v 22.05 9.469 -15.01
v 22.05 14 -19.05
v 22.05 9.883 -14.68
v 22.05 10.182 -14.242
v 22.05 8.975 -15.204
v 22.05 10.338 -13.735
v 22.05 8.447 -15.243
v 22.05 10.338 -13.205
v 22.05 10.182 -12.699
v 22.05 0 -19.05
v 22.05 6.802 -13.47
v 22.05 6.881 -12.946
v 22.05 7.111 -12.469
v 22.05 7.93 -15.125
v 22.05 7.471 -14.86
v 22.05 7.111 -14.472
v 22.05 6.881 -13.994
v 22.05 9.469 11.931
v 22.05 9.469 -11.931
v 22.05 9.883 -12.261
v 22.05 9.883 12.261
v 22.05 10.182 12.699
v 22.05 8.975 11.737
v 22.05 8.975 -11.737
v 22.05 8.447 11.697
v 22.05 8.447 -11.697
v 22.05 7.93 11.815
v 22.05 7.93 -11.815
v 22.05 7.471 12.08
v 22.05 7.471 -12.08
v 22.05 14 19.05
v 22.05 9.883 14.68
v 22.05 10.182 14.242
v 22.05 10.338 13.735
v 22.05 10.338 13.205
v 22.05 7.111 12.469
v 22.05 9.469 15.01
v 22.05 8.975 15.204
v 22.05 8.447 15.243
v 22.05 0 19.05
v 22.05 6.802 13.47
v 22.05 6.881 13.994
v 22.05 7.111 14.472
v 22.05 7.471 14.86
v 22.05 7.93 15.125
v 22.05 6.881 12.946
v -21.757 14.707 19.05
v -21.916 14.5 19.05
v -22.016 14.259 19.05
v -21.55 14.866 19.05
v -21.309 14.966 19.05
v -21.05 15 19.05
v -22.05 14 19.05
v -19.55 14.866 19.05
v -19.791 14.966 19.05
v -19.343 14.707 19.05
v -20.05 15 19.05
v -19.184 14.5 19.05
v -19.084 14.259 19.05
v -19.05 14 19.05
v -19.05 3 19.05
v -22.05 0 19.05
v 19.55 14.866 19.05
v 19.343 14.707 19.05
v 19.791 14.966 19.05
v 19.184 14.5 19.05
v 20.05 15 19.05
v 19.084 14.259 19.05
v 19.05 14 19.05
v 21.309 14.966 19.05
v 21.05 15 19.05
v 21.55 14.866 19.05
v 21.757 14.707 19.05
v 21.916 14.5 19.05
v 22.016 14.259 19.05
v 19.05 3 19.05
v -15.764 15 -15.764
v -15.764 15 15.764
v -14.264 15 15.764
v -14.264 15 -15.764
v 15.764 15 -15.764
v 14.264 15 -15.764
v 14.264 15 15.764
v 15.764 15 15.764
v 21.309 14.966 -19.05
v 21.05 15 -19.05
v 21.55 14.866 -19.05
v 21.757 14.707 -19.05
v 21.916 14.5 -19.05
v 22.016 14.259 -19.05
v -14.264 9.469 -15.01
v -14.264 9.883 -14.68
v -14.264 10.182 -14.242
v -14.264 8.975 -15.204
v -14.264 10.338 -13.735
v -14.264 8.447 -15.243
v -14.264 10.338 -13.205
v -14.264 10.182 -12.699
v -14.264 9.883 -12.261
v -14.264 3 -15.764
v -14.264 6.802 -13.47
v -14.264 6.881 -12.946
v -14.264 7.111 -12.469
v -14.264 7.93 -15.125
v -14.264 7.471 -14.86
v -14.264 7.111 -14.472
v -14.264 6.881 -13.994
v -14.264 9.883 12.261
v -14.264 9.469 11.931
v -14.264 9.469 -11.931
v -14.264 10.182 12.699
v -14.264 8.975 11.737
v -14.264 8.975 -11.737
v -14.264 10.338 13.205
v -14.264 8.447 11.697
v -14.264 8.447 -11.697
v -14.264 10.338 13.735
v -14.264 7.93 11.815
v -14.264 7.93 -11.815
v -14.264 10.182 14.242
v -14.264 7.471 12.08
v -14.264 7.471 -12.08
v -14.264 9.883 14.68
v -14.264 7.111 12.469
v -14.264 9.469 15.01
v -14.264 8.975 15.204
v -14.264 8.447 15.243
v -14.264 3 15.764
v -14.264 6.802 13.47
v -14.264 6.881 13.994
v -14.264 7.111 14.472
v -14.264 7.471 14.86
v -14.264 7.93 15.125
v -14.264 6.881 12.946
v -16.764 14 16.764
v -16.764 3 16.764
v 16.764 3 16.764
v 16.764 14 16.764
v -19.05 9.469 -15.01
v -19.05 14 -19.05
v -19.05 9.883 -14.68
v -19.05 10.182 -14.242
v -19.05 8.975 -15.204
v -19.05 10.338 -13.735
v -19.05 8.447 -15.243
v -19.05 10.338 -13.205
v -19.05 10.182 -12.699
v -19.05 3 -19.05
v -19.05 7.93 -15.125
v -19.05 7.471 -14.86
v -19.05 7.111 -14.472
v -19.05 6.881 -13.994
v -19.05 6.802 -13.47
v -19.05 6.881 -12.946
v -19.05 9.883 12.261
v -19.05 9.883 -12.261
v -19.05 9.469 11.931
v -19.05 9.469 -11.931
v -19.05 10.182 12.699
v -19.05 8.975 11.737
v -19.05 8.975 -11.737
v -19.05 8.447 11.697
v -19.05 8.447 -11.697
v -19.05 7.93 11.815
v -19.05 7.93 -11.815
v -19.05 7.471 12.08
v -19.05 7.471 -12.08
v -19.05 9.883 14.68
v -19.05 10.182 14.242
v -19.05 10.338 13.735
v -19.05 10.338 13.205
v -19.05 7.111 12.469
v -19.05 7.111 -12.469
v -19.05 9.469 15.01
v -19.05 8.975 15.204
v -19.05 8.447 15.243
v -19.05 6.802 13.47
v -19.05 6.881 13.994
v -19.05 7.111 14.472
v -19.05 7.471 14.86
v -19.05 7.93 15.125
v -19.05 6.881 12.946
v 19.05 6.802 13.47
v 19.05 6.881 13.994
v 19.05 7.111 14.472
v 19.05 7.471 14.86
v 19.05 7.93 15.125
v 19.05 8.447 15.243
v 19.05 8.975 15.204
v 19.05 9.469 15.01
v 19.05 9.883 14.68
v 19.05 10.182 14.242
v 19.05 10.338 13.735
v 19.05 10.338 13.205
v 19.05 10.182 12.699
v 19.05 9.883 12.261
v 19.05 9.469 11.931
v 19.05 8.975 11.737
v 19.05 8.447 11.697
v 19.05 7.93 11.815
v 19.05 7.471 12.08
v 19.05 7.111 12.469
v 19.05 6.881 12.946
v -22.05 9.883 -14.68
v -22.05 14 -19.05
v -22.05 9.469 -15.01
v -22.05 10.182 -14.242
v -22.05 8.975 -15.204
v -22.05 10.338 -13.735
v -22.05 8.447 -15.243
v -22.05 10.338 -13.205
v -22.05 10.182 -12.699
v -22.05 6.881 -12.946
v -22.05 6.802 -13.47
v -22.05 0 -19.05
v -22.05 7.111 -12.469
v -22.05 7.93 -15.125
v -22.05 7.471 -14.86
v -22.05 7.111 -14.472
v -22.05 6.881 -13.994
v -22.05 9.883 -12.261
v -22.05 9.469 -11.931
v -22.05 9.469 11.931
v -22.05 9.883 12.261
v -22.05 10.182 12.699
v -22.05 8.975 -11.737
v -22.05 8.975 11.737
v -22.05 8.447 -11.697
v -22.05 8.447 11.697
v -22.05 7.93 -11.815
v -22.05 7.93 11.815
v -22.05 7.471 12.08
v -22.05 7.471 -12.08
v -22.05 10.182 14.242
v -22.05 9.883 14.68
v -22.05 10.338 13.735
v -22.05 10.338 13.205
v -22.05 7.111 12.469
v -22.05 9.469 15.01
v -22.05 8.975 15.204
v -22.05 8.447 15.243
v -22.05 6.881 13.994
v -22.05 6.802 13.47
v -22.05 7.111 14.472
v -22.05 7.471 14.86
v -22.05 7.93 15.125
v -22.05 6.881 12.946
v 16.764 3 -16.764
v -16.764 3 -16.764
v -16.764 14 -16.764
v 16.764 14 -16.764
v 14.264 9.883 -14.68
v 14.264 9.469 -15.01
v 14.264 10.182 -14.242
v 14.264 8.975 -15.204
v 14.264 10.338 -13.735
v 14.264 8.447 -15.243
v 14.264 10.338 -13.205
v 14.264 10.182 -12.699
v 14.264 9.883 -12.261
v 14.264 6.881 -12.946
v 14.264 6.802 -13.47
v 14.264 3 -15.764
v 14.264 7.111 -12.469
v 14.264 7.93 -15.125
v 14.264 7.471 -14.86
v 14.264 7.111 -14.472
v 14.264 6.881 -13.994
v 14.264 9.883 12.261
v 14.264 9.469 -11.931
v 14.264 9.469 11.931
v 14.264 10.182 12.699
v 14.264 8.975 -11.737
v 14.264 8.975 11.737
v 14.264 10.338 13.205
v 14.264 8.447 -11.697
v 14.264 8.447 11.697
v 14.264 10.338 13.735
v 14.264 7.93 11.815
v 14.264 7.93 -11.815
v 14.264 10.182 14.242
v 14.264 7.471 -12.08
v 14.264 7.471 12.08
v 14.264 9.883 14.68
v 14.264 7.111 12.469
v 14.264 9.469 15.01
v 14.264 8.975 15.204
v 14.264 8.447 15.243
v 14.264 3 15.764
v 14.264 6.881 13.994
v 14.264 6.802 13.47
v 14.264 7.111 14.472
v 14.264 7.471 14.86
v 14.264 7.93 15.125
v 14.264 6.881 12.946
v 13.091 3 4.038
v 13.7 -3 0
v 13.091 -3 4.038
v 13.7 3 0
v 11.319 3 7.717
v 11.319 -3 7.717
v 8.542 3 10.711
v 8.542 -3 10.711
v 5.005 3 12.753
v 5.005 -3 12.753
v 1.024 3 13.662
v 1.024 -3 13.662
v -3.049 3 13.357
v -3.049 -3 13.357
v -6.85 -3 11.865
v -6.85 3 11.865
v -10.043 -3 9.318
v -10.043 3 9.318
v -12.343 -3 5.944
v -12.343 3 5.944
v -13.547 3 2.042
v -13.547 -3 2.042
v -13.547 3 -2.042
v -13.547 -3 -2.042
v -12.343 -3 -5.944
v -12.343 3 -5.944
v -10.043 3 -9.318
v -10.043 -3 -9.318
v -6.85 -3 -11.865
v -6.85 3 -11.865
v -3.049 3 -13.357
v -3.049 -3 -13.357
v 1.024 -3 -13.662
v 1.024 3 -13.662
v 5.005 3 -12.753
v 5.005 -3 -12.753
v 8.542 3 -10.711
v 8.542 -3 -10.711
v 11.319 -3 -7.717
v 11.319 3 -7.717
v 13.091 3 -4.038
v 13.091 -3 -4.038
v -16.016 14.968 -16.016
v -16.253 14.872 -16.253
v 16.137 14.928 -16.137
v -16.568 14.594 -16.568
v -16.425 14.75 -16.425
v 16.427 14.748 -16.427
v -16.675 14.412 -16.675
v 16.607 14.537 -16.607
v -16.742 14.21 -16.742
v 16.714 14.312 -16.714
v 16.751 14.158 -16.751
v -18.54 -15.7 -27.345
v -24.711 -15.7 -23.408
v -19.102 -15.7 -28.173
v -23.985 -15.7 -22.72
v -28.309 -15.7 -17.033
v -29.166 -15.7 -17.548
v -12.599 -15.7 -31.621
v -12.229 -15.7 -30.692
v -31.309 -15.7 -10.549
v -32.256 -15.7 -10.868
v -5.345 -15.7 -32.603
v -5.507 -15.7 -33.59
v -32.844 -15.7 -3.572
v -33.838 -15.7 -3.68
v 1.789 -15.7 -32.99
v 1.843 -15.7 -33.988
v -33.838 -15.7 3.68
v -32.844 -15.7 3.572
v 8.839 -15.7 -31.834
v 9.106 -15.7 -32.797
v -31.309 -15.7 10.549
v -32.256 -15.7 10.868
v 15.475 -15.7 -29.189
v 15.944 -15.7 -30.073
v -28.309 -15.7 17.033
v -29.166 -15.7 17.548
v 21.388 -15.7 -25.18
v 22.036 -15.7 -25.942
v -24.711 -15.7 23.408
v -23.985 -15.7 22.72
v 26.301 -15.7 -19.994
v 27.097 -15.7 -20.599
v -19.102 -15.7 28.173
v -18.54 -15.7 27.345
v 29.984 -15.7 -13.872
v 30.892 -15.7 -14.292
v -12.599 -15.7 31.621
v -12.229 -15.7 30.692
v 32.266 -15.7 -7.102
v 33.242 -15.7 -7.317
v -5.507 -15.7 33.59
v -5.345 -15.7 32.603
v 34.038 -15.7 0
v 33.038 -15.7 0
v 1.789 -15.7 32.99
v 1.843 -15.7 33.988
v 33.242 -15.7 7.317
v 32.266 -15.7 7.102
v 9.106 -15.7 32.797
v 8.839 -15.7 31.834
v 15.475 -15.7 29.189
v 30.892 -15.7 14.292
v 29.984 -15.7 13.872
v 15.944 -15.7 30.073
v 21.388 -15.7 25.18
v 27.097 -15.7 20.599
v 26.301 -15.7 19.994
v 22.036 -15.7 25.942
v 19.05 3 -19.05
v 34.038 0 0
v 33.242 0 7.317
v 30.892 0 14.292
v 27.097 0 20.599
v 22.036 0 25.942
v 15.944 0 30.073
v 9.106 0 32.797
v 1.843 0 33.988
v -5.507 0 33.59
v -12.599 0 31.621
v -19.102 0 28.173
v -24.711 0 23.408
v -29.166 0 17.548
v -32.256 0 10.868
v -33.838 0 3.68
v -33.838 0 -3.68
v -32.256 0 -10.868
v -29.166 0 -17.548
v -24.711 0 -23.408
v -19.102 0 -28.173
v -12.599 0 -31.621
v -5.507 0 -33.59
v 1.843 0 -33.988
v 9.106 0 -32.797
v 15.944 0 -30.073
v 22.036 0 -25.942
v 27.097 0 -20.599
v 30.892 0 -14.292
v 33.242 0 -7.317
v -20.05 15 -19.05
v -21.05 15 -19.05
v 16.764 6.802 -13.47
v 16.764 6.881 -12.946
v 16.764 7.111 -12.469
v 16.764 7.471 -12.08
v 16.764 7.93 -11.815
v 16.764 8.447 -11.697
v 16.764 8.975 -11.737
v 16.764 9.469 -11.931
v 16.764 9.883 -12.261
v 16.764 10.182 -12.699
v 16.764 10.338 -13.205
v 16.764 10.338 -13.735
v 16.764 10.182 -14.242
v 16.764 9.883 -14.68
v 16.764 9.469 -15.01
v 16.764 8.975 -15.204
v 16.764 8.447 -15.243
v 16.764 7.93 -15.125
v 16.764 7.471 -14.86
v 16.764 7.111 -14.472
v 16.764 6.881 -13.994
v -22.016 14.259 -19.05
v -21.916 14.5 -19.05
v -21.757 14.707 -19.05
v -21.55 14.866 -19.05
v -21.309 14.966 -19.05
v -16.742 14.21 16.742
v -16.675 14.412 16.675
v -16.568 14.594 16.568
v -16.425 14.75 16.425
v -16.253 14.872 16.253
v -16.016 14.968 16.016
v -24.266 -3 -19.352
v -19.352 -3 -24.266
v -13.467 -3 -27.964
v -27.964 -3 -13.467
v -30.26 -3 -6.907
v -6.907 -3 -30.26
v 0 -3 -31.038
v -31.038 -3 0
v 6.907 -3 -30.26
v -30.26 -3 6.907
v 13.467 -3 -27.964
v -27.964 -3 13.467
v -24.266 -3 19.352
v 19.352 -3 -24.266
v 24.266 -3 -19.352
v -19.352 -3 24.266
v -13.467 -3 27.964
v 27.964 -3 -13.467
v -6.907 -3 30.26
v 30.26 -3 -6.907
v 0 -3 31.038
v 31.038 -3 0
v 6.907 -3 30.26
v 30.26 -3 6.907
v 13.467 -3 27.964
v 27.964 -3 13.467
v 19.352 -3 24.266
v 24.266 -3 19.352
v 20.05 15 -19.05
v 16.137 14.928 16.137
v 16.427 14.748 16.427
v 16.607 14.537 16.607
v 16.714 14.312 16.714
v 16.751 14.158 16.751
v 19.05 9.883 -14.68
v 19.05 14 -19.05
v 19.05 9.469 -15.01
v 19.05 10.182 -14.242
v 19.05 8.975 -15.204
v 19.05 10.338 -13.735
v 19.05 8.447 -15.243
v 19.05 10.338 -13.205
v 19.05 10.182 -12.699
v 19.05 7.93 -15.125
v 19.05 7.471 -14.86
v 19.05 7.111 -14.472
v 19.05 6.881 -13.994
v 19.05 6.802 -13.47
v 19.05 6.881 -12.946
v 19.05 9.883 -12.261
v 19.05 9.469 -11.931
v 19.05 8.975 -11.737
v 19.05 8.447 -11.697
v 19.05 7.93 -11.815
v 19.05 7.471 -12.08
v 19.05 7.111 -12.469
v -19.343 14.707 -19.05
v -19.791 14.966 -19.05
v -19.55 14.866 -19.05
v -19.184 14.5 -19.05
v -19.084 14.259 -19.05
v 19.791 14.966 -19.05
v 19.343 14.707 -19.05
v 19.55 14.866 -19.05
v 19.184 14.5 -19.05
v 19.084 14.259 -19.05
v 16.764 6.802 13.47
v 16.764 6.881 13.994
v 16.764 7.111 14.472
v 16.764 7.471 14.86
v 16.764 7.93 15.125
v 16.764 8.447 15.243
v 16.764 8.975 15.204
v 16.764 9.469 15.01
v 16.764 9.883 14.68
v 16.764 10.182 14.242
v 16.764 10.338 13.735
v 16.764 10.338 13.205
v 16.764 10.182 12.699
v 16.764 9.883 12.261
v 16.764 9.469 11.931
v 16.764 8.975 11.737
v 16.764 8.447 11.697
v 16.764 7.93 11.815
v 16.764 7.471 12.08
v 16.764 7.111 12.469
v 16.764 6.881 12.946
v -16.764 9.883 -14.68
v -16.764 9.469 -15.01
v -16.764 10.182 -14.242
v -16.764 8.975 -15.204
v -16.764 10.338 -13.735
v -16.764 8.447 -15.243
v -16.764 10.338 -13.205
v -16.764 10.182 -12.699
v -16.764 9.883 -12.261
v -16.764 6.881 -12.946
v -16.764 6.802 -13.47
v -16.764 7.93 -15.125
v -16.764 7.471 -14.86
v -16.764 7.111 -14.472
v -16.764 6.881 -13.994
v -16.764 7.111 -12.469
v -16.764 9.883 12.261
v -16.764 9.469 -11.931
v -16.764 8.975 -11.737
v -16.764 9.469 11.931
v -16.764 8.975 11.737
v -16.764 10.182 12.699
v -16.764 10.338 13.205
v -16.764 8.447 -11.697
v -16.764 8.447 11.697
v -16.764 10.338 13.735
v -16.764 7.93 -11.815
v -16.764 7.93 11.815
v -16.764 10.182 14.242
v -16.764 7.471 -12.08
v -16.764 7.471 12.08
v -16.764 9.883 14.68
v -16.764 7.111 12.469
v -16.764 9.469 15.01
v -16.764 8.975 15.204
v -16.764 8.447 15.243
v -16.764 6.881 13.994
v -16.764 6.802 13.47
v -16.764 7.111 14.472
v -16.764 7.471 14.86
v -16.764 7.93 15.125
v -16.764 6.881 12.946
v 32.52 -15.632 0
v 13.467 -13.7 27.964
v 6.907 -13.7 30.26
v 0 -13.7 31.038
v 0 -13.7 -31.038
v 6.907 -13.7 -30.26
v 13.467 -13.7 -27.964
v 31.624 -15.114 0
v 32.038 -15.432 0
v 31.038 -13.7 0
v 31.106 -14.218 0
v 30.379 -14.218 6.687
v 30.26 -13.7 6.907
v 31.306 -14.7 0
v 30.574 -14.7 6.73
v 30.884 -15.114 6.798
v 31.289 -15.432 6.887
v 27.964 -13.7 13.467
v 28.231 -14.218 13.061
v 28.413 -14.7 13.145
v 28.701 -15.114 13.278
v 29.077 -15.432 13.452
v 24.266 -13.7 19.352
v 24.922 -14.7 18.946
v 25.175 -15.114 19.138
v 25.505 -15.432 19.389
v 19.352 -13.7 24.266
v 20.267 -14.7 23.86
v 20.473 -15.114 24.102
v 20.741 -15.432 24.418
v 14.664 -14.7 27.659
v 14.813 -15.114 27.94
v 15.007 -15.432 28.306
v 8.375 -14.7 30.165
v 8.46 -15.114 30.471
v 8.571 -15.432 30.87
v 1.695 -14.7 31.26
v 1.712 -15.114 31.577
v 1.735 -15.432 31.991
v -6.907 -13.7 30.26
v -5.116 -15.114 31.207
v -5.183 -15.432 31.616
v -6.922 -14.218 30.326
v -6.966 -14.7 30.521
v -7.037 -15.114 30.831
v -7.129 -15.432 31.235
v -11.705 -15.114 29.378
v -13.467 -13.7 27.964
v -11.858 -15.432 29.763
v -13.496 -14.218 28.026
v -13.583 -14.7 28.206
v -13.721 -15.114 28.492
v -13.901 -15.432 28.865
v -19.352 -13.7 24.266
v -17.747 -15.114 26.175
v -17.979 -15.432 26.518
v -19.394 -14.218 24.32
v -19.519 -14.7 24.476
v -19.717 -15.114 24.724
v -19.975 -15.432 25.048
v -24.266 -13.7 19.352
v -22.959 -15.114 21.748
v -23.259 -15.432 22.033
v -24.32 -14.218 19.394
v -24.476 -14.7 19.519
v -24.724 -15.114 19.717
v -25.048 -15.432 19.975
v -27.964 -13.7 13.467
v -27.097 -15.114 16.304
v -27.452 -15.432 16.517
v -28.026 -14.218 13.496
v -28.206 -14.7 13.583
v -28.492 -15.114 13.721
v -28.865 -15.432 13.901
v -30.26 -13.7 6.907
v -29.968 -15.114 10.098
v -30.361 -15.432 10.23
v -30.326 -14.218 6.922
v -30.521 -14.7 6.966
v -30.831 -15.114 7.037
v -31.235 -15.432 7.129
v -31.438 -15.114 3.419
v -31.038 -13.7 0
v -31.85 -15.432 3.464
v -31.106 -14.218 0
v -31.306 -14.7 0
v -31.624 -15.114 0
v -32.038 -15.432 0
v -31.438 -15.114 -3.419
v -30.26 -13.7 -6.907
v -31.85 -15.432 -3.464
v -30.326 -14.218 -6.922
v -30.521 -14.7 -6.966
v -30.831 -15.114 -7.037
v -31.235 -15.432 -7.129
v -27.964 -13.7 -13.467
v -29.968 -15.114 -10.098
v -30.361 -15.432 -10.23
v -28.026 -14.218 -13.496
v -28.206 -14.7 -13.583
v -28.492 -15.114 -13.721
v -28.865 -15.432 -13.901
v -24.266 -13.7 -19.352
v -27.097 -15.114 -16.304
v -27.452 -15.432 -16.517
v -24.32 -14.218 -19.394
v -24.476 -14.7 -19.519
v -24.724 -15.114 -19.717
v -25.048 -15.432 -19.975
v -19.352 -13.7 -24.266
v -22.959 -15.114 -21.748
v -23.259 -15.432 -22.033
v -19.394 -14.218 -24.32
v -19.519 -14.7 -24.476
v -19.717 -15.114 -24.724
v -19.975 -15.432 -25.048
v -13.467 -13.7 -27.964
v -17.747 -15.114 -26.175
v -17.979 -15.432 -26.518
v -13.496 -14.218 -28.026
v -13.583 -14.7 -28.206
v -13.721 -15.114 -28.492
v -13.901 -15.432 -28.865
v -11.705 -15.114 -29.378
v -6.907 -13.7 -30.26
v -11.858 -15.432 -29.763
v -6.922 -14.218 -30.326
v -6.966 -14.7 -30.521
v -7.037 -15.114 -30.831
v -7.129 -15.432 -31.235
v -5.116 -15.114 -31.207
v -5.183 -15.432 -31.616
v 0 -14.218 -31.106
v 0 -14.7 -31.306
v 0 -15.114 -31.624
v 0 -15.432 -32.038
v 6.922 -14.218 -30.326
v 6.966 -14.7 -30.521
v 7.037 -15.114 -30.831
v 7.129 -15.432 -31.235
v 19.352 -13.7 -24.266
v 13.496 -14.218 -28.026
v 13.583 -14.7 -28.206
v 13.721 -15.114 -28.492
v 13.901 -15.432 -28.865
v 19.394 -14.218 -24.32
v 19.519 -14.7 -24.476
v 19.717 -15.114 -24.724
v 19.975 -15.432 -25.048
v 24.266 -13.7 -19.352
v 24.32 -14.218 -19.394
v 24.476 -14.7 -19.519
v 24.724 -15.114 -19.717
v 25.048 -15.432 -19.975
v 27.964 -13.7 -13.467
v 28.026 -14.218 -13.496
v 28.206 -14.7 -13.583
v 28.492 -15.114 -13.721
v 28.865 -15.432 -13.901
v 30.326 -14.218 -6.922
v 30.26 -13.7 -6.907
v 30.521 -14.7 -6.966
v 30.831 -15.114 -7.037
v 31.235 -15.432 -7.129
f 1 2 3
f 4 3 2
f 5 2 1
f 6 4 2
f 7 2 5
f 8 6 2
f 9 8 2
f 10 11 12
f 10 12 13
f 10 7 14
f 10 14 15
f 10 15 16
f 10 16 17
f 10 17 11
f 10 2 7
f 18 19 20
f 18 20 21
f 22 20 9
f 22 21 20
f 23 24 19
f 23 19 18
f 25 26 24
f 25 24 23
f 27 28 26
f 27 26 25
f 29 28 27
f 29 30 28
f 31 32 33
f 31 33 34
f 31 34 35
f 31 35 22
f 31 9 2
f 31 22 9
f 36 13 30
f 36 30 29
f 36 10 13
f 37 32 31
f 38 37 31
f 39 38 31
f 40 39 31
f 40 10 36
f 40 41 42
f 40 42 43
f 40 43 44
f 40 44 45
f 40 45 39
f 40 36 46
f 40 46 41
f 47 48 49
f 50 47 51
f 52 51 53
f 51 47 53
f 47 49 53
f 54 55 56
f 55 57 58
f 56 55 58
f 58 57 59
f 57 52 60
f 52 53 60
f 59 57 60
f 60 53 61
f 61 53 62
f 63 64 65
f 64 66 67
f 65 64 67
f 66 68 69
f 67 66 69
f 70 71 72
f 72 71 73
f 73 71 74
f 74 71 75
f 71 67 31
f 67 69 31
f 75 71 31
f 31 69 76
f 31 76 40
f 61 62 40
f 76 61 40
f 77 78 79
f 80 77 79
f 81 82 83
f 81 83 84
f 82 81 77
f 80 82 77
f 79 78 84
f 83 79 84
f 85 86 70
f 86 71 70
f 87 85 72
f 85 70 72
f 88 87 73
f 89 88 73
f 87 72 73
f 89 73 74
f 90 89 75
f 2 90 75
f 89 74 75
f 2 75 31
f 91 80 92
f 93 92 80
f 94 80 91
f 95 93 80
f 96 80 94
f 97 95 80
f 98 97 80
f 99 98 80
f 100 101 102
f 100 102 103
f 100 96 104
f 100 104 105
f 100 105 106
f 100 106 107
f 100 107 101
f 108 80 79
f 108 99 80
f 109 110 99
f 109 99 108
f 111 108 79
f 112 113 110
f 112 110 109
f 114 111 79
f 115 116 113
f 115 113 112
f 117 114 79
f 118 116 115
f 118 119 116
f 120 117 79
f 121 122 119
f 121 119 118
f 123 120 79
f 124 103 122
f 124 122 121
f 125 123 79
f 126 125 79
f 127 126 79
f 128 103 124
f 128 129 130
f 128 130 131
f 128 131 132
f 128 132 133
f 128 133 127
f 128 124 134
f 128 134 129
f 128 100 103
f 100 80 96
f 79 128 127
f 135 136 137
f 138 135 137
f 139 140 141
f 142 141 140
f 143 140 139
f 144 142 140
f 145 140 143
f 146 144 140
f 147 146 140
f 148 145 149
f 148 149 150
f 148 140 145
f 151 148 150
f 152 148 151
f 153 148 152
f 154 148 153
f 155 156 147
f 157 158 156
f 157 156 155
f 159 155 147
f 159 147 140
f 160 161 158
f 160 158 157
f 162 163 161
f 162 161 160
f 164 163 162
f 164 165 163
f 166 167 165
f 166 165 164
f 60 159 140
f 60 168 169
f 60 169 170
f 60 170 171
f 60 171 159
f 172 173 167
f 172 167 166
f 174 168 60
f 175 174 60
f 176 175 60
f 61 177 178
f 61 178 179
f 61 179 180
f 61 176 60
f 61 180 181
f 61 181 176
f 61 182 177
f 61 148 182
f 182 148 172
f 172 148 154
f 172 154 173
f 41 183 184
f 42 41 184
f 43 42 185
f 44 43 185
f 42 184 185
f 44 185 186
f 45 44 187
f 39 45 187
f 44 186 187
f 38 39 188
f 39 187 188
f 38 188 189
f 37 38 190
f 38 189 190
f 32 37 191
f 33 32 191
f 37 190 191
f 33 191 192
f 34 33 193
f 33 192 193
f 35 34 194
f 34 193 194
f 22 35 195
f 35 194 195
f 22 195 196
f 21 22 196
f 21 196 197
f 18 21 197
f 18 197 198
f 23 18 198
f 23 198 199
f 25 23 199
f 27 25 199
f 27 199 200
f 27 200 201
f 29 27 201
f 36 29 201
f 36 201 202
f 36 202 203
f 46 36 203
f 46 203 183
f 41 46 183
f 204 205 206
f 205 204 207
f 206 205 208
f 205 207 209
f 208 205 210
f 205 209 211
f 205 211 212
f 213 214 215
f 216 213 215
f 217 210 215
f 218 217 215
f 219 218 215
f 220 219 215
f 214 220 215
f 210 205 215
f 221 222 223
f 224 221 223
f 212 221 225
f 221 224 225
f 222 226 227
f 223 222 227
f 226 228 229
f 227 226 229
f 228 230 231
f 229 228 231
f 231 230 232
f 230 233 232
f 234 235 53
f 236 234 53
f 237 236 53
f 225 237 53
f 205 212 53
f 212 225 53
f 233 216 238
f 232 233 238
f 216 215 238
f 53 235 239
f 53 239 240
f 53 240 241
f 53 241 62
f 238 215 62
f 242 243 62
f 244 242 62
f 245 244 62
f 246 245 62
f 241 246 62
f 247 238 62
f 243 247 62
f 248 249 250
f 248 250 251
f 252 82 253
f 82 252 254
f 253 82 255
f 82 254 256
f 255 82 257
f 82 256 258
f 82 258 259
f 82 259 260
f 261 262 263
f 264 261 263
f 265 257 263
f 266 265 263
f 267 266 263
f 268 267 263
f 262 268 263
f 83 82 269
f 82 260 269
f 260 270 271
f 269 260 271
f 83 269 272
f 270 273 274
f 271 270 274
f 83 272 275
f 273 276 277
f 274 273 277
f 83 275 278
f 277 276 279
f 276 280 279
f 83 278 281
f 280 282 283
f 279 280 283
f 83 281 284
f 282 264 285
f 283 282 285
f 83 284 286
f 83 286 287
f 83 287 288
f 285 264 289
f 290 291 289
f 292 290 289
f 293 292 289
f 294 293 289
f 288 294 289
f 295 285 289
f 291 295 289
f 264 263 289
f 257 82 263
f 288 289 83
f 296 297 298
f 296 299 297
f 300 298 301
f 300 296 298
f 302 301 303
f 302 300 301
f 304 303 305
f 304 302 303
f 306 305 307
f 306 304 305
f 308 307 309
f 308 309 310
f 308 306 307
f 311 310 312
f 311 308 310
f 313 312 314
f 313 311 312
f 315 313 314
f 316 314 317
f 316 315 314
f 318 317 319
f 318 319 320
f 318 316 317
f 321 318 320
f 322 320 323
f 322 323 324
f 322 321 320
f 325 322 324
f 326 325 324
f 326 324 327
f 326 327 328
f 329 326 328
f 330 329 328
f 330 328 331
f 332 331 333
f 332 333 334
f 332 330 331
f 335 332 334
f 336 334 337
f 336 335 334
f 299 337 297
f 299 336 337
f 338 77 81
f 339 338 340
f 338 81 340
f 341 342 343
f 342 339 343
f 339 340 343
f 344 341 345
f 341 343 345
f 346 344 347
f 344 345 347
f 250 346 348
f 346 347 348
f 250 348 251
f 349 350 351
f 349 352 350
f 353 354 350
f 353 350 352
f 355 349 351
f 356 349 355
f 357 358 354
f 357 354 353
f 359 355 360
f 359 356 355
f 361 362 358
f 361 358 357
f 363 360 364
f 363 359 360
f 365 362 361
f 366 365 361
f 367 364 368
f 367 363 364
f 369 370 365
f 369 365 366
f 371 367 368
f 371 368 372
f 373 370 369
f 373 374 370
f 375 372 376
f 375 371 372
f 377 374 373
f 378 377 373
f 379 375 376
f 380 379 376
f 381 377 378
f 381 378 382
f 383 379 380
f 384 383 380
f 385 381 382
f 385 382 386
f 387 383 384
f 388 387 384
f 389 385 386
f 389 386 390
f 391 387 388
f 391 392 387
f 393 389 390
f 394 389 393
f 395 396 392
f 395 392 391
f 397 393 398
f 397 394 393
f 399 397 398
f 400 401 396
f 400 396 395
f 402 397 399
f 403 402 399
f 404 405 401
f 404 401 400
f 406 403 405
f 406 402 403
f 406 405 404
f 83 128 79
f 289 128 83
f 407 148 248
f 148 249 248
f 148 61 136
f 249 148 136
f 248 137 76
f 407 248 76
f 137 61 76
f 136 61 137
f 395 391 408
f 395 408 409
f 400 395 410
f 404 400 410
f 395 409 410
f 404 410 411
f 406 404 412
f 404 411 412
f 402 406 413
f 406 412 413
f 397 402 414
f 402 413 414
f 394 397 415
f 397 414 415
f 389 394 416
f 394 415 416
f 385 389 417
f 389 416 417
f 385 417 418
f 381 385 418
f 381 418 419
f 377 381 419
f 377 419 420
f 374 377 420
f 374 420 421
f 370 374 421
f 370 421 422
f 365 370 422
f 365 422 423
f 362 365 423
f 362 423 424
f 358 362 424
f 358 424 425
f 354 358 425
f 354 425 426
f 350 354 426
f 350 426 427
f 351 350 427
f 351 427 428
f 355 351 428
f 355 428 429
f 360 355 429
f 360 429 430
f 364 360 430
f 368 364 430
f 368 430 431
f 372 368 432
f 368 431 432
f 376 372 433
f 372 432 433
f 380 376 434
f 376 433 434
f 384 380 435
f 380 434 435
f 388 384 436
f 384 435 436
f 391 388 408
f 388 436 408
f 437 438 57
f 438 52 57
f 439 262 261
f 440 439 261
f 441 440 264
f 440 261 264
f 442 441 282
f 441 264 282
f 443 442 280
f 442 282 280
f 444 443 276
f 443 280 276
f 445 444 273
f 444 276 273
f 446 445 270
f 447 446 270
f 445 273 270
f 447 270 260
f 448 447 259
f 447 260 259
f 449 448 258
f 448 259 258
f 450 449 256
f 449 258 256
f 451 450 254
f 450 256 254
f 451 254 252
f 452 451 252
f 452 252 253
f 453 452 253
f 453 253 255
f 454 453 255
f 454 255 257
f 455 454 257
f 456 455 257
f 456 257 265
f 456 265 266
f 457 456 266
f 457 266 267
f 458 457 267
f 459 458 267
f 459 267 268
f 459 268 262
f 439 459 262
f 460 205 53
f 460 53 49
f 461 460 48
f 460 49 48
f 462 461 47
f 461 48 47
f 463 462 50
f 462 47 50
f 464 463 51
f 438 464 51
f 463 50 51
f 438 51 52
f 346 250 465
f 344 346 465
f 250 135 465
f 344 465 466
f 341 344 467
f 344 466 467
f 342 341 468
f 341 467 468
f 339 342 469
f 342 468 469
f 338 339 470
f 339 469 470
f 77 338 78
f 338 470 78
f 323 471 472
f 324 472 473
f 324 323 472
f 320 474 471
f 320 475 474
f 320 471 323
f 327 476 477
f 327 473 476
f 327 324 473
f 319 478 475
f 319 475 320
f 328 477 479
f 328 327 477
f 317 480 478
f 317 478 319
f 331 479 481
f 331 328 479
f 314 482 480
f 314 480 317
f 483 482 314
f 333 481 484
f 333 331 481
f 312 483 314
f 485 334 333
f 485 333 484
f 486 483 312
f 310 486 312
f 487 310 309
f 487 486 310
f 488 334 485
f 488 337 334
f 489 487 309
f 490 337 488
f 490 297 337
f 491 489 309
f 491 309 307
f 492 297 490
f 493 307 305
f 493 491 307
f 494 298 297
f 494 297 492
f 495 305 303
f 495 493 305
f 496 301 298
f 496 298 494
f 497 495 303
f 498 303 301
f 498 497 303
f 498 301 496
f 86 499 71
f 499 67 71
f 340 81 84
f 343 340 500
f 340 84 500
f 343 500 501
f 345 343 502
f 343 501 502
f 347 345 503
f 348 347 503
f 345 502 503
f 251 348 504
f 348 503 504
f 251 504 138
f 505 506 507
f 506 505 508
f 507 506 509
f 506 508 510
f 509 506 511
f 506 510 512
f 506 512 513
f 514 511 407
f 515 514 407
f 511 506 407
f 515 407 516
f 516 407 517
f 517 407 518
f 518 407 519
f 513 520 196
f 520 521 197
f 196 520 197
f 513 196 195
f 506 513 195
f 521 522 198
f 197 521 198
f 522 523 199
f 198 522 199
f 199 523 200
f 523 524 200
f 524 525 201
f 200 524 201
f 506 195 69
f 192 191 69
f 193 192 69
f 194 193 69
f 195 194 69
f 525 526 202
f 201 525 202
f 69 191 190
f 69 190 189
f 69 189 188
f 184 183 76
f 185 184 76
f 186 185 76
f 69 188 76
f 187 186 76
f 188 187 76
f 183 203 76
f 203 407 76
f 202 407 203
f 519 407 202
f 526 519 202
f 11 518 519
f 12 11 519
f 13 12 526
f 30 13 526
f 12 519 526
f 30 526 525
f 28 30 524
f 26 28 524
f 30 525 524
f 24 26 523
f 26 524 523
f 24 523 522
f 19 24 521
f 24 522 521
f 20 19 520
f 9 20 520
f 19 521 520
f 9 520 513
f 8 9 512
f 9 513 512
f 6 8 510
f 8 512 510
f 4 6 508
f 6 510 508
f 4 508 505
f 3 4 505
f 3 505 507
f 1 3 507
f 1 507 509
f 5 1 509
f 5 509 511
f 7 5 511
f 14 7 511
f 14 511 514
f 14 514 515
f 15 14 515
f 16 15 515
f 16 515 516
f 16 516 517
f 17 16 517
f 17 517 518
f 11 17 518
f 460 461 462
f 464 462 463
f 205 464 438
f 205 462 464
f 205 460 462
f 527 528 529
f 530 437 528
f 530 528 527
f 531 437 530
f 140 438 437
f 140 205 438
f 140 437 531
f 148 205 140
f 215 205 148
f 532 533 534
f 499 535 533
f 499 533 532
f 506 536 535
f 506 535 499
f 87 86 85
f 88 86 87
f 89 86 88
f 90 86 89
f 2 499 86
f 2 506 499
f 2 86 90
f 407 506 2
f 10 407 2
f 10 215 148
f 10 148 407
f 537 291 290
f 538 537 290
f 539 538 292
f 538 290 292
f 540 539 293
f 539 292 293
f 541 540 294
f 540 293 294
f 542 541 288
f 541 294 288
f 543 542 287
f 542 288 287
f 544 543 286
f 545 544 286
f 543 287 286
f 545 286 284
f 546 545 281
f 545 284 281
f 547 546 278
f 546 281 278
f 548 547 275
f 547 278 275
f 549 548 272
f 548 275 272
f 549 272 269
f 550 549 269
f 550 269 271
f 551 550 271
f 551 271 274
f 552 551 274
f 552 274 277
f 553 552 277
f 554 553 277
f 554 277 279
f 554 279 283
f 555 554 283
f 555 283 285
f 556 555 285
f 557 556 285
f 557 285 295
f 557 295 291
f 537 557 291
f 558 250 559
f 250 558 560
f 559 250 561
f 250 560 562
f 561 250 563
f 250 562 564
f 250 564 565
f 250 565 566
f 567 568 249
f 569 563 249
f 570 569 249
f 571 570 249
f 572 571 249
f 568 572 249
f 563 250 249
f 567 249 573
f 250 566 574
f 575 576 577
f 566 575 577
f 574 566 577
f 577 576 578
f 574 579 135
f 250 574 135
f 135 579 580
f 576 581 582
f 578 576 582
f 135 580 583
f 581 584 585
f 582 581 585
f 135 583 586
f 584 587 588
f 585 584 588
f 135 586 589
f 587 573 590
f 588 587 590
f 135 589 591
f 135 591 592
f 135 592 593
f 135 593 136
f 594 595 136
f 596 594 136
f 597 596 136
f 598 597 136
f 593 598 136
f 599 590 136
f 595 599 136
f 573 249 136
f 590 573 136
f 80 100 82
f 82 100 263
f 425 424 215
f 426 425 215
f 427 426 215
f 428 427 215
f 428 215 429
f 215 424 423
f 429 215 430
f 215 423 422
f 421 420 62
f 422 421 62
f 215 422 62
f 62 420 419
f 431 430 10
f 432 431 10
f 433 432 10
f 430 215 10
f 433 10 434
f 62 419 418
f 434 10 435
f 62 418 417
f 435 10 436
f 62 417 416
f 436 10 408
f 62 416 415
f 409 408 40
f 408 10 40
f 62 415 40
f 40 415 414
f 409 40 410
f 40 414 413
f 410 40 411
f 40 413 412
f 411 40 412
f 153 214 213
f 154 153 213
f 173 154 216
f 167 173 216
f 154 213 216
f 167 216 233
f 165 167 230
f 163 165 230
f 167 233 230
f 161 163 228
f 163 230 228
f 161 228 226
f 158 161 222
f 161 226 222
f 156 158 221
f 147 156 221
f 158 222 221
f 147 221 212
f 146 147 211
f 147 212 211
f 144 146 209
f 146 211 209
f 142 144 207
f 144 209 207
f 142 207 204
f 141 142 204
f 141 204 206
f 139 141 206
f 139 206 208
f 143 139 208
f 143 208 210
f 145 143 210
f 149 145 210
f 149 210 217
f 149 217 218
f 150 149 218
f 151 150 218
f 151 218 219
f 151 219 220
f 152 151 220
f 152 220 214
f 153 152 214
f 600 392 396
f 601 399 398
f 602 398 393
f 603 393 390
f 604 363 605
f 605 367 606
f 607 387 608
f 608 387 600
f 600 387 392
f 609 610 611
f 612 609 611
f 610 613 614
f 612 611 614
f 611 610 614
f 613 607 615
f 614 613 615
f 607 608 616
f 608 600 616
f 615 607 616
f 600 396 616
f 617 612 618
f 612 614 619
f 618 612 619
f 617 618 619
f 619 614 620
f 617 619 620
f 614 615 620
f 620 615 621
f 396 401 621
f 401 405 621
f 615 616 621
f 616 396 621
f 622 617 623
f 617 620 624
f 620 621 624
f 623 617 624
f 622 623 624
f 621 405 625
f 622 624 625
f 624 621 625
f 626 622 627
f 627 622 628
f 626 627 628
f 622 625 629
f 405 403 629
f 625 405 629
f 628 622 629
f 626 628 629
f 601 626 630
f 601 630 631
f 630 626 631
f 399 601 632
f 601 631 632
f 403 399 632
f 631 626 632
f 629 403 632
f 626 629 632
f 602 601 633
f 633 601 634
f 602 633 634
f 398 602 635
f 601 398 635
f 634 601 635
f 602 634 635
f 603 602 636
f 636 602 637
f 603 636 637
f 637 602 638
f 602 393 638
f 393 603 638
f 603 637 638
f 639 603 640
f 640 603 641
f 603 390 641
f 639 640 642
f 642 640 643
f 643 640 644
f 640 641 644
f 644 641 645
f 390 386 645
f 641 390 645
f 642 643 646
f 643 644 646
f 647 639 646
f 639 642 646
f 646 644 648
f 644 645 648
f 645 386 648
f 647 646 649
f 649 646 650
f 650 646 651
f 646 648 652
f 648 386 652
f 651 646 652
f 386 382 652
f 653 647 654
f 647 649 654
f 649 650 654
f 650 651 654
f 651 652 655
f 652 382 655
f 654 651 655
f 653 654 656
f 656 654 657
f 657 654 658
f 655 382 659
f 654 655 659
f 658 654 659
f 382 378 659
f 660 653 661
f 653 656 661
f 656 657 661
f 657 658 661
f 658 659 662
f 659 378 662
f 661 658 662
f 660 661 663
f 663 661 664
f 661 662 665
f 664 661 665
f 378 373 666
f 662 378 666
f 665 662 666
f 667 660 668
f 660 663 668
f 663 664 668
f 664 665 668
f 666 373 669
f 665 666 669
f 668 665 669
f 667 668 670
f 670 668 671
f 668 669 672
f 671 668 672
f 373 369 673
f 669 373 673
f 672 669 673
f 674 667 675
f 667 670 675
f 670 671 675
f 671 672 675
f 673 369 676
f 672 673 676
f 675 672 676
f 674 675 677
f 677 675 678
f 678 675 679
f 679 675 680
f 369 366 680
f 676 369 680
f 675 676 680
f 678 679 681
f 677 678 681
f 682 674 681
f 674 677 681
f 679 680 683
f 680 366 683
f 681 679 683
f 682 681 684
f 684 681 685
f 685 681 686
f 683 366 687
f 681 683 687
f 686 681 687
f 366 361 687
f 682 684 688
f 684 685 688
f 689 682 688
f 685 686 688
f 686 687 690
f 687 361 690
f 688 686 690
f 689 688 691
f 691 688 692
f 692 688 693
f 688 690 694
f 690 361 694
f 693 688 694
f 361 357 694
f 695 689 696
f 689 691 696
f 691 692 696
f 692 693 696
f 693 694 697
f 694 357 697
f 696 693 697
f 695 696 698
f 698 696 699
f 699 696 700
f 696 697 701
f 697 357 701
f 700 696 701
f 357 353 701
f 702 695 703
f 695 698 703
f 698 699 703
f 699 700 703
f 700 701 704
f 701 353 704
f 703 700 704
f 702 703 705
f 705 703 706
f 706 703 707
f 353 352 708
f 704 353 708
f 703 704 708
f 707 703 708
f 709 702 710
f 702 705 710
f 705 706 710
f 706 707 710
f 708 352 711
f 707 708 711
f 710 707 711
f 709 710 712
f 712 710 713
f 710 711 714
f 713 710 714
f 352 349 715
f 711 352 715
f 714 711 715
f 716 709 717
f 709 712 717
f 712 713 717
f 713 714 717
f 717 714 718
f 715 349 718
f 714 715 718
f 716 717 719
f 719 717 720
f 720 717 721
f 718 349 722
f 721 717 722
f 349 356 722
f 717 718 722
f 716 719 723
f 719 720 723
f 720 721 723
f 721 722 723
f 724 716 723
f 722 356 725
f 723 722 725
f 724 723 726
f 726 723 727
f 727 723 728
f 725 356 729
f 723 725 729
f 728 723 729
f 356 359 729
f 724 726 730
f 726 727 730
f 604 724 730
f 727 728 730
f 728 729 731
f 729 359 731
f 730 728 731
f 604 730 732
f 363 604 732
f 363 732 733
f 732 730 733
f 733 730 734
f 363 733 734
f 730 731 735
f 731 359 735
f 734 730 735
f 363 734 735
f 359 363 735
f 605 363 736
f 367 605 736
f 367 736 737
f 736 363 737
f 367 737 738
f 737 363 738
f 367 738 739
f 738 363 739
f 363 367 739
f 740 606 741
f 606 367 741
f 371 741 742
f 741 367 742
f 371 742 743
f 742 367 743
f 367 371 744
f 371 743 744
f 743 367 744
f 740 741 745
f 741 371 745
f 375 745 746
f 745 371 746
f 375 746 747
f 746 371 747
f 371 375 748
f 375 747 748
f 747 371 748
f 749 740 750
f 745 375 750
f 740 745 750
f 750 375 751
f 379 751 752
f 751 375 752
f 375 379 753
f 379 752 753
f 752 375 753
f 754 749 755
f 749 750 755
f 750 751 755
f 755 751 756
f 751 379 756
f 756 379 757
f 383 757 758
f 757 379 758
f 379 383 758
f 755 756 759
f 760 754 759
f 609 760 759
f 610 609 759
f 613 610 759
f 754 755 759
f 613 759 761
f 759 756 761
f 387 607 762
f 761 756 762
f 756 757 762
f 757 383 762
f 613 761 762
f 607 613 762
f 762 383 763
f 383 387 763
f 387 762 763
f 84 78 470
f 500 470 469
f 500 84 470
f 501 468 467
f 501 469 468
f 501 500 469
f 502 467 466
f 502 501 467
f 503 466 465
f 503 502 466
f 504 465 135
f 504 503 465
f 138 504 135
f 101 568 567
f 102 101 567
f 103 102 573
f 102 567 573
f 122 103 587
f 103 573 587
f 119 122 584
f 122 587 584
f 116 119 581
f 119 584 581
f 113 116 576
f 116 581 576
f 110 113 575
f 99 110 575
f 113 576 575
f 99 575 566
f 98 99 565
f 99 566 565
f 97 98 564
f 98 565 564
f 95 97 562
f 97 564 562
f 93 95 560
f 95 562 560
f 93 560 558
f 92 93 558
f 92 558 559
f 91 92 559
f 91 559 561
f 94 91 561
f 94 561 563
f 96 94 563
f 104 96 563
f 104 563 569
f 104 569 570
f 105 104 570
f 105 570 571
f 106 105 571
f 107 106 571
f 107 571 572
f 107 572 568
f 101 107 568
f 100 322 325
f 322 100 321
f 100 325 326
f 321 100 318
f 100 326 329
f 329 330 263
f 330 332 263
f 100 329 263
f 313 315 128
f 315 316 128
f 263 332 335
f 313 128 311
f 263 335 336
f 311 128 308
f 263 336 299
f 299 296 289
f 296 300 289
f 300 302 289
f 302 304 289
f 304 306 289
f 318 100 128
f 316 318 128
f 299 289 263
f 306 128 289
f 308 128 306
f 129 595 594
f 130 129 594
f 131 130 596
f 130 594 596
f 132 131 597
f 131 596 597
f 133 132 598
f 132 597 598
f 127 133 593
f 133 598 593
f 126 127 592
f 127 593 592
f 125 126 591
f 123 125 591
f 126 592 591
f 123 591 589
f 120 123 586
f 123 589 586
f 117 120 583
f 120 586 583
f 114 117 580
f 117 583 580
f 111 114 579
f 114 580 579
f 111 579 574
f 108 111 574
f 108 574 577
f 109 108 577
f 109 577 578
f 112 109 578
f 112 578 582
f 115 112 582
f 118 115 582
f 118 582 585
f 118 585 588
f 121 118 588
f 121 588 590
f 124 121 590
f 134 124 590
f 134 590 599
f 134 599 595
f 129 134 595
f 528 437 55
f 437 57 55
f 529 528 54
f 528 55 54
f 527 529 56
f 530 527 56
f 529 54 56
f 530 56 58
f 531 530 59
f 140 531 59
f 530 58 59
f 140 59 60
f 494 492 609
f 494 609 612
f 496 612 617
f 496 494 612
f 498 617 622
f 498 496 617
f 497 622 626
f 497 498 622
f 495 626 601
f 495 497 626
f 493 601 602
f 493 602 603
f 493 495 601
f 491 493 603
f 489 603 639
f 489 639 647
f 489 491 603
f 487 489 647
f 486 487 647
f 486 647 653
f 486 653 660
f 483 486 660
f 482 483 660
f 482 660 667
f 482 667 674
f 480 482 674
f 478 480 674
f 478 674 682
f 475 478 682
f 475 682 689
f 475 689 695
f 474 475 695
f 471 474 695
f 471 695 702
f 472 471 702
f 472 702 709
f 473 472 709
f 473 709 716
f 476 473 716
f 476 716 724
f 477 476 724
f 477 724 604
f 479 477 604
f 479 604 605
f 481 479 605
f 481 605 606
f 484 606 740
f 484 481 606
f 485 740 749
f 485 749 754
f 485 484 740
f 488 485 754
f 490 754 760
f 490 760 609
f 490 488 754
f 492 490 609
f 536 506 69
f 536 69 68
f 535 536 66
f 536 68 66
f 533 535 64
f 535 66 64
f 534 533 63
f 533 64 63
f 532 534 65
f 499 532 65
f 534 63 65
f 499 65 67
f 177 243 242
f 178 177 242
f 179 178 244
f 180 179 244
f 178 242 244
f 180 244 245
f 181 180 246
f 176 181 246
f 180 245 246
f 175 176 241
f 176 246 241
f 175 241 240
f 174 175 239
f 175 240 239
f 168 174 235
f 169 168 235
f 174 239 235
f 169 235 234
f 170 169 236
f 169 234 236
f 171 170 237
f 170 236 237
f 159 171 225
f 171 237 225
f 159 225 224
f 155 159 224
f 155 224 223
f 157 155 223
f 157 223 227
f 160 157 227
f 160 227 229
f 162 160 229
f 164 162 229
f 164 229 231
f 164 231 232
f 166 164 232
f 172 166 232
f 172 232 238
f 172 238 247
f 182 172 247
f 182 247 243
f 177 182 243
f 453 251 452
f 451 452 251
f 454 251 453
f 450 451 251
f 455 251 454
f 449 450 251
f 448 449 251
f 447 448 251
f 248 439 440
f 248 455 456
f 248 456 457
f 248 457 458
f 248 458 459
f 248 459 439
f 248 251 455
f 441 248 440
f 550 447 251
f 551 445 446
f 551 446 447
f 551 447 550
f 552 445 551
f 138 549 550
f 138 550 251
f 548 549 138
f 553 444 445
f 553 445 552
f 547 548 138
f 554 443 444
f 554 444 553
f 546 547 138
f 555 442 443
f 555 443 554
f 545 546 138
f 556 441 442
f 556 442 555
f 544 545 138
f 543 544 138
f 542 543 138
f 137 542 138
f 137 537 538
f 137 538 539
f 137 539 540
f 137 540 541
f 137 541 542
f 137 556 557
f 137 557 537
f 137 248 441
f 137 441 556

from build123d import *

# Parameters (mm, degrees)
F0_R     = 34.038
F0_R_2   = 31.038
F0_W     = 38.1
F0_H     = 38.1
F0_R_3   = 13.7
F1_DEPTH = 3
F2_DEPTH = 3
F3_DEPTH = 15.7
F4_R     = 2
F5_W     = 3
F5_H     = 38.1
F5_W_2   = 33.528
F5_H_2   = 33.528
F5_W_3   = 28.528
F5_H_3   = 31.528
F6_DEPTH = 15
F7_R     = 0.99999
F8_R     = 1.778
F9_DEPTH = 56.089


# Not quite as in the source:
# - a fillet or chamfer is up to 0.001 mm smaller than in the source, because OpenCascade refuses the exact size
# - a feature names something its author has since deleted; it is built from what else it names


with BuildPart() as f1:
    # F0 (on Front) → F1 (new body)
    with BuildSketch(Plane.XZ):
        Circle(F0_R)
        Circle(F0_R_2, mode=Mode.SUBTRACT)
        Circle(F0_R_2)
        Rectangle(F0_W, F0_H, mode=Mode.SUBTRACT)
        Rectangle(F0_W, F0_H)
        Circle(F0_R_3, mode=Mode.SUBTRACT)
    extrude(amount=F1_DEPTH)

    # F0 (on Front) → F2 (join)
    with BuildSketch(Plane.XZ):
        Rectangle(F0_W, F0_H)
        Circle(F0_R_3, mode=Mode.SUBTRACT)
    extrude(amount=-F2_DEPTH)

    # F0 (on Front) → F3 (join)
    with BuildSketch(Plane.XZ):
        Circle(F0_R)
        Circle(F0_R_2, mode=Mode.SUBTRACT)
    extrude(amount=F3_DEPTH)

    # F4
    f4_edges = [f1.edges().sort_by_distance(p)[0] for p in [
        (-31.038, -15.7, 0),
    ]]
    fillet(f4_edges, radius=F4_R)

    # F5 (on Front) → F6 (join)
    with BuildSketch(Plane.XZ):
        with Locations((-20.55, 0)):
            Rectangle(F5_W, F5_H)
        with Locations((20.55, 0)):
            Rectangle(F5_W, F5_H)
        Rectangle(F5_W_2, F5_H_2)
        Rectangle(F5_W_3, F5_H_3, mode=Mode.SUBTRACT)
    extrude(amount=-F6_DEPTH)

    # F7 (radius 1 in the source; OpenCascade refuses exactly that, so slightly less here)
    f7_edges = [f1.edges().sort_by_distance(p)[0] for p in [
        (-19.05, 15, 0),
        (-16.764, 15, 0),
        (19.05, 15, 0),
        (16.764, 15, 0),
        (0, 15, 16.764),
        (0, 15, -16.764),
        (22.05, 15, 0),
        (-22.05, 15, 0),
    ]]
    fillet(f7_edges, radius=F7_R)

    # F8 (on face) → F9 (cut, through all)
    with BuildSketch(Plane(origin=(-22.05, 0, 0), x_dir=(0, -1, 0), z_dir=(-1, 0, 0))):
        with Locations((-8.5796158184, 13.4703841816)):
            Circle(F8_R)
        with Locations((-8.5796158184, -13.4703841816)):
            Circle(F8_R)
    extrude(amount=-F9_DEPTH, mode=Mode.SUBTRACT)


solid = f1.part
